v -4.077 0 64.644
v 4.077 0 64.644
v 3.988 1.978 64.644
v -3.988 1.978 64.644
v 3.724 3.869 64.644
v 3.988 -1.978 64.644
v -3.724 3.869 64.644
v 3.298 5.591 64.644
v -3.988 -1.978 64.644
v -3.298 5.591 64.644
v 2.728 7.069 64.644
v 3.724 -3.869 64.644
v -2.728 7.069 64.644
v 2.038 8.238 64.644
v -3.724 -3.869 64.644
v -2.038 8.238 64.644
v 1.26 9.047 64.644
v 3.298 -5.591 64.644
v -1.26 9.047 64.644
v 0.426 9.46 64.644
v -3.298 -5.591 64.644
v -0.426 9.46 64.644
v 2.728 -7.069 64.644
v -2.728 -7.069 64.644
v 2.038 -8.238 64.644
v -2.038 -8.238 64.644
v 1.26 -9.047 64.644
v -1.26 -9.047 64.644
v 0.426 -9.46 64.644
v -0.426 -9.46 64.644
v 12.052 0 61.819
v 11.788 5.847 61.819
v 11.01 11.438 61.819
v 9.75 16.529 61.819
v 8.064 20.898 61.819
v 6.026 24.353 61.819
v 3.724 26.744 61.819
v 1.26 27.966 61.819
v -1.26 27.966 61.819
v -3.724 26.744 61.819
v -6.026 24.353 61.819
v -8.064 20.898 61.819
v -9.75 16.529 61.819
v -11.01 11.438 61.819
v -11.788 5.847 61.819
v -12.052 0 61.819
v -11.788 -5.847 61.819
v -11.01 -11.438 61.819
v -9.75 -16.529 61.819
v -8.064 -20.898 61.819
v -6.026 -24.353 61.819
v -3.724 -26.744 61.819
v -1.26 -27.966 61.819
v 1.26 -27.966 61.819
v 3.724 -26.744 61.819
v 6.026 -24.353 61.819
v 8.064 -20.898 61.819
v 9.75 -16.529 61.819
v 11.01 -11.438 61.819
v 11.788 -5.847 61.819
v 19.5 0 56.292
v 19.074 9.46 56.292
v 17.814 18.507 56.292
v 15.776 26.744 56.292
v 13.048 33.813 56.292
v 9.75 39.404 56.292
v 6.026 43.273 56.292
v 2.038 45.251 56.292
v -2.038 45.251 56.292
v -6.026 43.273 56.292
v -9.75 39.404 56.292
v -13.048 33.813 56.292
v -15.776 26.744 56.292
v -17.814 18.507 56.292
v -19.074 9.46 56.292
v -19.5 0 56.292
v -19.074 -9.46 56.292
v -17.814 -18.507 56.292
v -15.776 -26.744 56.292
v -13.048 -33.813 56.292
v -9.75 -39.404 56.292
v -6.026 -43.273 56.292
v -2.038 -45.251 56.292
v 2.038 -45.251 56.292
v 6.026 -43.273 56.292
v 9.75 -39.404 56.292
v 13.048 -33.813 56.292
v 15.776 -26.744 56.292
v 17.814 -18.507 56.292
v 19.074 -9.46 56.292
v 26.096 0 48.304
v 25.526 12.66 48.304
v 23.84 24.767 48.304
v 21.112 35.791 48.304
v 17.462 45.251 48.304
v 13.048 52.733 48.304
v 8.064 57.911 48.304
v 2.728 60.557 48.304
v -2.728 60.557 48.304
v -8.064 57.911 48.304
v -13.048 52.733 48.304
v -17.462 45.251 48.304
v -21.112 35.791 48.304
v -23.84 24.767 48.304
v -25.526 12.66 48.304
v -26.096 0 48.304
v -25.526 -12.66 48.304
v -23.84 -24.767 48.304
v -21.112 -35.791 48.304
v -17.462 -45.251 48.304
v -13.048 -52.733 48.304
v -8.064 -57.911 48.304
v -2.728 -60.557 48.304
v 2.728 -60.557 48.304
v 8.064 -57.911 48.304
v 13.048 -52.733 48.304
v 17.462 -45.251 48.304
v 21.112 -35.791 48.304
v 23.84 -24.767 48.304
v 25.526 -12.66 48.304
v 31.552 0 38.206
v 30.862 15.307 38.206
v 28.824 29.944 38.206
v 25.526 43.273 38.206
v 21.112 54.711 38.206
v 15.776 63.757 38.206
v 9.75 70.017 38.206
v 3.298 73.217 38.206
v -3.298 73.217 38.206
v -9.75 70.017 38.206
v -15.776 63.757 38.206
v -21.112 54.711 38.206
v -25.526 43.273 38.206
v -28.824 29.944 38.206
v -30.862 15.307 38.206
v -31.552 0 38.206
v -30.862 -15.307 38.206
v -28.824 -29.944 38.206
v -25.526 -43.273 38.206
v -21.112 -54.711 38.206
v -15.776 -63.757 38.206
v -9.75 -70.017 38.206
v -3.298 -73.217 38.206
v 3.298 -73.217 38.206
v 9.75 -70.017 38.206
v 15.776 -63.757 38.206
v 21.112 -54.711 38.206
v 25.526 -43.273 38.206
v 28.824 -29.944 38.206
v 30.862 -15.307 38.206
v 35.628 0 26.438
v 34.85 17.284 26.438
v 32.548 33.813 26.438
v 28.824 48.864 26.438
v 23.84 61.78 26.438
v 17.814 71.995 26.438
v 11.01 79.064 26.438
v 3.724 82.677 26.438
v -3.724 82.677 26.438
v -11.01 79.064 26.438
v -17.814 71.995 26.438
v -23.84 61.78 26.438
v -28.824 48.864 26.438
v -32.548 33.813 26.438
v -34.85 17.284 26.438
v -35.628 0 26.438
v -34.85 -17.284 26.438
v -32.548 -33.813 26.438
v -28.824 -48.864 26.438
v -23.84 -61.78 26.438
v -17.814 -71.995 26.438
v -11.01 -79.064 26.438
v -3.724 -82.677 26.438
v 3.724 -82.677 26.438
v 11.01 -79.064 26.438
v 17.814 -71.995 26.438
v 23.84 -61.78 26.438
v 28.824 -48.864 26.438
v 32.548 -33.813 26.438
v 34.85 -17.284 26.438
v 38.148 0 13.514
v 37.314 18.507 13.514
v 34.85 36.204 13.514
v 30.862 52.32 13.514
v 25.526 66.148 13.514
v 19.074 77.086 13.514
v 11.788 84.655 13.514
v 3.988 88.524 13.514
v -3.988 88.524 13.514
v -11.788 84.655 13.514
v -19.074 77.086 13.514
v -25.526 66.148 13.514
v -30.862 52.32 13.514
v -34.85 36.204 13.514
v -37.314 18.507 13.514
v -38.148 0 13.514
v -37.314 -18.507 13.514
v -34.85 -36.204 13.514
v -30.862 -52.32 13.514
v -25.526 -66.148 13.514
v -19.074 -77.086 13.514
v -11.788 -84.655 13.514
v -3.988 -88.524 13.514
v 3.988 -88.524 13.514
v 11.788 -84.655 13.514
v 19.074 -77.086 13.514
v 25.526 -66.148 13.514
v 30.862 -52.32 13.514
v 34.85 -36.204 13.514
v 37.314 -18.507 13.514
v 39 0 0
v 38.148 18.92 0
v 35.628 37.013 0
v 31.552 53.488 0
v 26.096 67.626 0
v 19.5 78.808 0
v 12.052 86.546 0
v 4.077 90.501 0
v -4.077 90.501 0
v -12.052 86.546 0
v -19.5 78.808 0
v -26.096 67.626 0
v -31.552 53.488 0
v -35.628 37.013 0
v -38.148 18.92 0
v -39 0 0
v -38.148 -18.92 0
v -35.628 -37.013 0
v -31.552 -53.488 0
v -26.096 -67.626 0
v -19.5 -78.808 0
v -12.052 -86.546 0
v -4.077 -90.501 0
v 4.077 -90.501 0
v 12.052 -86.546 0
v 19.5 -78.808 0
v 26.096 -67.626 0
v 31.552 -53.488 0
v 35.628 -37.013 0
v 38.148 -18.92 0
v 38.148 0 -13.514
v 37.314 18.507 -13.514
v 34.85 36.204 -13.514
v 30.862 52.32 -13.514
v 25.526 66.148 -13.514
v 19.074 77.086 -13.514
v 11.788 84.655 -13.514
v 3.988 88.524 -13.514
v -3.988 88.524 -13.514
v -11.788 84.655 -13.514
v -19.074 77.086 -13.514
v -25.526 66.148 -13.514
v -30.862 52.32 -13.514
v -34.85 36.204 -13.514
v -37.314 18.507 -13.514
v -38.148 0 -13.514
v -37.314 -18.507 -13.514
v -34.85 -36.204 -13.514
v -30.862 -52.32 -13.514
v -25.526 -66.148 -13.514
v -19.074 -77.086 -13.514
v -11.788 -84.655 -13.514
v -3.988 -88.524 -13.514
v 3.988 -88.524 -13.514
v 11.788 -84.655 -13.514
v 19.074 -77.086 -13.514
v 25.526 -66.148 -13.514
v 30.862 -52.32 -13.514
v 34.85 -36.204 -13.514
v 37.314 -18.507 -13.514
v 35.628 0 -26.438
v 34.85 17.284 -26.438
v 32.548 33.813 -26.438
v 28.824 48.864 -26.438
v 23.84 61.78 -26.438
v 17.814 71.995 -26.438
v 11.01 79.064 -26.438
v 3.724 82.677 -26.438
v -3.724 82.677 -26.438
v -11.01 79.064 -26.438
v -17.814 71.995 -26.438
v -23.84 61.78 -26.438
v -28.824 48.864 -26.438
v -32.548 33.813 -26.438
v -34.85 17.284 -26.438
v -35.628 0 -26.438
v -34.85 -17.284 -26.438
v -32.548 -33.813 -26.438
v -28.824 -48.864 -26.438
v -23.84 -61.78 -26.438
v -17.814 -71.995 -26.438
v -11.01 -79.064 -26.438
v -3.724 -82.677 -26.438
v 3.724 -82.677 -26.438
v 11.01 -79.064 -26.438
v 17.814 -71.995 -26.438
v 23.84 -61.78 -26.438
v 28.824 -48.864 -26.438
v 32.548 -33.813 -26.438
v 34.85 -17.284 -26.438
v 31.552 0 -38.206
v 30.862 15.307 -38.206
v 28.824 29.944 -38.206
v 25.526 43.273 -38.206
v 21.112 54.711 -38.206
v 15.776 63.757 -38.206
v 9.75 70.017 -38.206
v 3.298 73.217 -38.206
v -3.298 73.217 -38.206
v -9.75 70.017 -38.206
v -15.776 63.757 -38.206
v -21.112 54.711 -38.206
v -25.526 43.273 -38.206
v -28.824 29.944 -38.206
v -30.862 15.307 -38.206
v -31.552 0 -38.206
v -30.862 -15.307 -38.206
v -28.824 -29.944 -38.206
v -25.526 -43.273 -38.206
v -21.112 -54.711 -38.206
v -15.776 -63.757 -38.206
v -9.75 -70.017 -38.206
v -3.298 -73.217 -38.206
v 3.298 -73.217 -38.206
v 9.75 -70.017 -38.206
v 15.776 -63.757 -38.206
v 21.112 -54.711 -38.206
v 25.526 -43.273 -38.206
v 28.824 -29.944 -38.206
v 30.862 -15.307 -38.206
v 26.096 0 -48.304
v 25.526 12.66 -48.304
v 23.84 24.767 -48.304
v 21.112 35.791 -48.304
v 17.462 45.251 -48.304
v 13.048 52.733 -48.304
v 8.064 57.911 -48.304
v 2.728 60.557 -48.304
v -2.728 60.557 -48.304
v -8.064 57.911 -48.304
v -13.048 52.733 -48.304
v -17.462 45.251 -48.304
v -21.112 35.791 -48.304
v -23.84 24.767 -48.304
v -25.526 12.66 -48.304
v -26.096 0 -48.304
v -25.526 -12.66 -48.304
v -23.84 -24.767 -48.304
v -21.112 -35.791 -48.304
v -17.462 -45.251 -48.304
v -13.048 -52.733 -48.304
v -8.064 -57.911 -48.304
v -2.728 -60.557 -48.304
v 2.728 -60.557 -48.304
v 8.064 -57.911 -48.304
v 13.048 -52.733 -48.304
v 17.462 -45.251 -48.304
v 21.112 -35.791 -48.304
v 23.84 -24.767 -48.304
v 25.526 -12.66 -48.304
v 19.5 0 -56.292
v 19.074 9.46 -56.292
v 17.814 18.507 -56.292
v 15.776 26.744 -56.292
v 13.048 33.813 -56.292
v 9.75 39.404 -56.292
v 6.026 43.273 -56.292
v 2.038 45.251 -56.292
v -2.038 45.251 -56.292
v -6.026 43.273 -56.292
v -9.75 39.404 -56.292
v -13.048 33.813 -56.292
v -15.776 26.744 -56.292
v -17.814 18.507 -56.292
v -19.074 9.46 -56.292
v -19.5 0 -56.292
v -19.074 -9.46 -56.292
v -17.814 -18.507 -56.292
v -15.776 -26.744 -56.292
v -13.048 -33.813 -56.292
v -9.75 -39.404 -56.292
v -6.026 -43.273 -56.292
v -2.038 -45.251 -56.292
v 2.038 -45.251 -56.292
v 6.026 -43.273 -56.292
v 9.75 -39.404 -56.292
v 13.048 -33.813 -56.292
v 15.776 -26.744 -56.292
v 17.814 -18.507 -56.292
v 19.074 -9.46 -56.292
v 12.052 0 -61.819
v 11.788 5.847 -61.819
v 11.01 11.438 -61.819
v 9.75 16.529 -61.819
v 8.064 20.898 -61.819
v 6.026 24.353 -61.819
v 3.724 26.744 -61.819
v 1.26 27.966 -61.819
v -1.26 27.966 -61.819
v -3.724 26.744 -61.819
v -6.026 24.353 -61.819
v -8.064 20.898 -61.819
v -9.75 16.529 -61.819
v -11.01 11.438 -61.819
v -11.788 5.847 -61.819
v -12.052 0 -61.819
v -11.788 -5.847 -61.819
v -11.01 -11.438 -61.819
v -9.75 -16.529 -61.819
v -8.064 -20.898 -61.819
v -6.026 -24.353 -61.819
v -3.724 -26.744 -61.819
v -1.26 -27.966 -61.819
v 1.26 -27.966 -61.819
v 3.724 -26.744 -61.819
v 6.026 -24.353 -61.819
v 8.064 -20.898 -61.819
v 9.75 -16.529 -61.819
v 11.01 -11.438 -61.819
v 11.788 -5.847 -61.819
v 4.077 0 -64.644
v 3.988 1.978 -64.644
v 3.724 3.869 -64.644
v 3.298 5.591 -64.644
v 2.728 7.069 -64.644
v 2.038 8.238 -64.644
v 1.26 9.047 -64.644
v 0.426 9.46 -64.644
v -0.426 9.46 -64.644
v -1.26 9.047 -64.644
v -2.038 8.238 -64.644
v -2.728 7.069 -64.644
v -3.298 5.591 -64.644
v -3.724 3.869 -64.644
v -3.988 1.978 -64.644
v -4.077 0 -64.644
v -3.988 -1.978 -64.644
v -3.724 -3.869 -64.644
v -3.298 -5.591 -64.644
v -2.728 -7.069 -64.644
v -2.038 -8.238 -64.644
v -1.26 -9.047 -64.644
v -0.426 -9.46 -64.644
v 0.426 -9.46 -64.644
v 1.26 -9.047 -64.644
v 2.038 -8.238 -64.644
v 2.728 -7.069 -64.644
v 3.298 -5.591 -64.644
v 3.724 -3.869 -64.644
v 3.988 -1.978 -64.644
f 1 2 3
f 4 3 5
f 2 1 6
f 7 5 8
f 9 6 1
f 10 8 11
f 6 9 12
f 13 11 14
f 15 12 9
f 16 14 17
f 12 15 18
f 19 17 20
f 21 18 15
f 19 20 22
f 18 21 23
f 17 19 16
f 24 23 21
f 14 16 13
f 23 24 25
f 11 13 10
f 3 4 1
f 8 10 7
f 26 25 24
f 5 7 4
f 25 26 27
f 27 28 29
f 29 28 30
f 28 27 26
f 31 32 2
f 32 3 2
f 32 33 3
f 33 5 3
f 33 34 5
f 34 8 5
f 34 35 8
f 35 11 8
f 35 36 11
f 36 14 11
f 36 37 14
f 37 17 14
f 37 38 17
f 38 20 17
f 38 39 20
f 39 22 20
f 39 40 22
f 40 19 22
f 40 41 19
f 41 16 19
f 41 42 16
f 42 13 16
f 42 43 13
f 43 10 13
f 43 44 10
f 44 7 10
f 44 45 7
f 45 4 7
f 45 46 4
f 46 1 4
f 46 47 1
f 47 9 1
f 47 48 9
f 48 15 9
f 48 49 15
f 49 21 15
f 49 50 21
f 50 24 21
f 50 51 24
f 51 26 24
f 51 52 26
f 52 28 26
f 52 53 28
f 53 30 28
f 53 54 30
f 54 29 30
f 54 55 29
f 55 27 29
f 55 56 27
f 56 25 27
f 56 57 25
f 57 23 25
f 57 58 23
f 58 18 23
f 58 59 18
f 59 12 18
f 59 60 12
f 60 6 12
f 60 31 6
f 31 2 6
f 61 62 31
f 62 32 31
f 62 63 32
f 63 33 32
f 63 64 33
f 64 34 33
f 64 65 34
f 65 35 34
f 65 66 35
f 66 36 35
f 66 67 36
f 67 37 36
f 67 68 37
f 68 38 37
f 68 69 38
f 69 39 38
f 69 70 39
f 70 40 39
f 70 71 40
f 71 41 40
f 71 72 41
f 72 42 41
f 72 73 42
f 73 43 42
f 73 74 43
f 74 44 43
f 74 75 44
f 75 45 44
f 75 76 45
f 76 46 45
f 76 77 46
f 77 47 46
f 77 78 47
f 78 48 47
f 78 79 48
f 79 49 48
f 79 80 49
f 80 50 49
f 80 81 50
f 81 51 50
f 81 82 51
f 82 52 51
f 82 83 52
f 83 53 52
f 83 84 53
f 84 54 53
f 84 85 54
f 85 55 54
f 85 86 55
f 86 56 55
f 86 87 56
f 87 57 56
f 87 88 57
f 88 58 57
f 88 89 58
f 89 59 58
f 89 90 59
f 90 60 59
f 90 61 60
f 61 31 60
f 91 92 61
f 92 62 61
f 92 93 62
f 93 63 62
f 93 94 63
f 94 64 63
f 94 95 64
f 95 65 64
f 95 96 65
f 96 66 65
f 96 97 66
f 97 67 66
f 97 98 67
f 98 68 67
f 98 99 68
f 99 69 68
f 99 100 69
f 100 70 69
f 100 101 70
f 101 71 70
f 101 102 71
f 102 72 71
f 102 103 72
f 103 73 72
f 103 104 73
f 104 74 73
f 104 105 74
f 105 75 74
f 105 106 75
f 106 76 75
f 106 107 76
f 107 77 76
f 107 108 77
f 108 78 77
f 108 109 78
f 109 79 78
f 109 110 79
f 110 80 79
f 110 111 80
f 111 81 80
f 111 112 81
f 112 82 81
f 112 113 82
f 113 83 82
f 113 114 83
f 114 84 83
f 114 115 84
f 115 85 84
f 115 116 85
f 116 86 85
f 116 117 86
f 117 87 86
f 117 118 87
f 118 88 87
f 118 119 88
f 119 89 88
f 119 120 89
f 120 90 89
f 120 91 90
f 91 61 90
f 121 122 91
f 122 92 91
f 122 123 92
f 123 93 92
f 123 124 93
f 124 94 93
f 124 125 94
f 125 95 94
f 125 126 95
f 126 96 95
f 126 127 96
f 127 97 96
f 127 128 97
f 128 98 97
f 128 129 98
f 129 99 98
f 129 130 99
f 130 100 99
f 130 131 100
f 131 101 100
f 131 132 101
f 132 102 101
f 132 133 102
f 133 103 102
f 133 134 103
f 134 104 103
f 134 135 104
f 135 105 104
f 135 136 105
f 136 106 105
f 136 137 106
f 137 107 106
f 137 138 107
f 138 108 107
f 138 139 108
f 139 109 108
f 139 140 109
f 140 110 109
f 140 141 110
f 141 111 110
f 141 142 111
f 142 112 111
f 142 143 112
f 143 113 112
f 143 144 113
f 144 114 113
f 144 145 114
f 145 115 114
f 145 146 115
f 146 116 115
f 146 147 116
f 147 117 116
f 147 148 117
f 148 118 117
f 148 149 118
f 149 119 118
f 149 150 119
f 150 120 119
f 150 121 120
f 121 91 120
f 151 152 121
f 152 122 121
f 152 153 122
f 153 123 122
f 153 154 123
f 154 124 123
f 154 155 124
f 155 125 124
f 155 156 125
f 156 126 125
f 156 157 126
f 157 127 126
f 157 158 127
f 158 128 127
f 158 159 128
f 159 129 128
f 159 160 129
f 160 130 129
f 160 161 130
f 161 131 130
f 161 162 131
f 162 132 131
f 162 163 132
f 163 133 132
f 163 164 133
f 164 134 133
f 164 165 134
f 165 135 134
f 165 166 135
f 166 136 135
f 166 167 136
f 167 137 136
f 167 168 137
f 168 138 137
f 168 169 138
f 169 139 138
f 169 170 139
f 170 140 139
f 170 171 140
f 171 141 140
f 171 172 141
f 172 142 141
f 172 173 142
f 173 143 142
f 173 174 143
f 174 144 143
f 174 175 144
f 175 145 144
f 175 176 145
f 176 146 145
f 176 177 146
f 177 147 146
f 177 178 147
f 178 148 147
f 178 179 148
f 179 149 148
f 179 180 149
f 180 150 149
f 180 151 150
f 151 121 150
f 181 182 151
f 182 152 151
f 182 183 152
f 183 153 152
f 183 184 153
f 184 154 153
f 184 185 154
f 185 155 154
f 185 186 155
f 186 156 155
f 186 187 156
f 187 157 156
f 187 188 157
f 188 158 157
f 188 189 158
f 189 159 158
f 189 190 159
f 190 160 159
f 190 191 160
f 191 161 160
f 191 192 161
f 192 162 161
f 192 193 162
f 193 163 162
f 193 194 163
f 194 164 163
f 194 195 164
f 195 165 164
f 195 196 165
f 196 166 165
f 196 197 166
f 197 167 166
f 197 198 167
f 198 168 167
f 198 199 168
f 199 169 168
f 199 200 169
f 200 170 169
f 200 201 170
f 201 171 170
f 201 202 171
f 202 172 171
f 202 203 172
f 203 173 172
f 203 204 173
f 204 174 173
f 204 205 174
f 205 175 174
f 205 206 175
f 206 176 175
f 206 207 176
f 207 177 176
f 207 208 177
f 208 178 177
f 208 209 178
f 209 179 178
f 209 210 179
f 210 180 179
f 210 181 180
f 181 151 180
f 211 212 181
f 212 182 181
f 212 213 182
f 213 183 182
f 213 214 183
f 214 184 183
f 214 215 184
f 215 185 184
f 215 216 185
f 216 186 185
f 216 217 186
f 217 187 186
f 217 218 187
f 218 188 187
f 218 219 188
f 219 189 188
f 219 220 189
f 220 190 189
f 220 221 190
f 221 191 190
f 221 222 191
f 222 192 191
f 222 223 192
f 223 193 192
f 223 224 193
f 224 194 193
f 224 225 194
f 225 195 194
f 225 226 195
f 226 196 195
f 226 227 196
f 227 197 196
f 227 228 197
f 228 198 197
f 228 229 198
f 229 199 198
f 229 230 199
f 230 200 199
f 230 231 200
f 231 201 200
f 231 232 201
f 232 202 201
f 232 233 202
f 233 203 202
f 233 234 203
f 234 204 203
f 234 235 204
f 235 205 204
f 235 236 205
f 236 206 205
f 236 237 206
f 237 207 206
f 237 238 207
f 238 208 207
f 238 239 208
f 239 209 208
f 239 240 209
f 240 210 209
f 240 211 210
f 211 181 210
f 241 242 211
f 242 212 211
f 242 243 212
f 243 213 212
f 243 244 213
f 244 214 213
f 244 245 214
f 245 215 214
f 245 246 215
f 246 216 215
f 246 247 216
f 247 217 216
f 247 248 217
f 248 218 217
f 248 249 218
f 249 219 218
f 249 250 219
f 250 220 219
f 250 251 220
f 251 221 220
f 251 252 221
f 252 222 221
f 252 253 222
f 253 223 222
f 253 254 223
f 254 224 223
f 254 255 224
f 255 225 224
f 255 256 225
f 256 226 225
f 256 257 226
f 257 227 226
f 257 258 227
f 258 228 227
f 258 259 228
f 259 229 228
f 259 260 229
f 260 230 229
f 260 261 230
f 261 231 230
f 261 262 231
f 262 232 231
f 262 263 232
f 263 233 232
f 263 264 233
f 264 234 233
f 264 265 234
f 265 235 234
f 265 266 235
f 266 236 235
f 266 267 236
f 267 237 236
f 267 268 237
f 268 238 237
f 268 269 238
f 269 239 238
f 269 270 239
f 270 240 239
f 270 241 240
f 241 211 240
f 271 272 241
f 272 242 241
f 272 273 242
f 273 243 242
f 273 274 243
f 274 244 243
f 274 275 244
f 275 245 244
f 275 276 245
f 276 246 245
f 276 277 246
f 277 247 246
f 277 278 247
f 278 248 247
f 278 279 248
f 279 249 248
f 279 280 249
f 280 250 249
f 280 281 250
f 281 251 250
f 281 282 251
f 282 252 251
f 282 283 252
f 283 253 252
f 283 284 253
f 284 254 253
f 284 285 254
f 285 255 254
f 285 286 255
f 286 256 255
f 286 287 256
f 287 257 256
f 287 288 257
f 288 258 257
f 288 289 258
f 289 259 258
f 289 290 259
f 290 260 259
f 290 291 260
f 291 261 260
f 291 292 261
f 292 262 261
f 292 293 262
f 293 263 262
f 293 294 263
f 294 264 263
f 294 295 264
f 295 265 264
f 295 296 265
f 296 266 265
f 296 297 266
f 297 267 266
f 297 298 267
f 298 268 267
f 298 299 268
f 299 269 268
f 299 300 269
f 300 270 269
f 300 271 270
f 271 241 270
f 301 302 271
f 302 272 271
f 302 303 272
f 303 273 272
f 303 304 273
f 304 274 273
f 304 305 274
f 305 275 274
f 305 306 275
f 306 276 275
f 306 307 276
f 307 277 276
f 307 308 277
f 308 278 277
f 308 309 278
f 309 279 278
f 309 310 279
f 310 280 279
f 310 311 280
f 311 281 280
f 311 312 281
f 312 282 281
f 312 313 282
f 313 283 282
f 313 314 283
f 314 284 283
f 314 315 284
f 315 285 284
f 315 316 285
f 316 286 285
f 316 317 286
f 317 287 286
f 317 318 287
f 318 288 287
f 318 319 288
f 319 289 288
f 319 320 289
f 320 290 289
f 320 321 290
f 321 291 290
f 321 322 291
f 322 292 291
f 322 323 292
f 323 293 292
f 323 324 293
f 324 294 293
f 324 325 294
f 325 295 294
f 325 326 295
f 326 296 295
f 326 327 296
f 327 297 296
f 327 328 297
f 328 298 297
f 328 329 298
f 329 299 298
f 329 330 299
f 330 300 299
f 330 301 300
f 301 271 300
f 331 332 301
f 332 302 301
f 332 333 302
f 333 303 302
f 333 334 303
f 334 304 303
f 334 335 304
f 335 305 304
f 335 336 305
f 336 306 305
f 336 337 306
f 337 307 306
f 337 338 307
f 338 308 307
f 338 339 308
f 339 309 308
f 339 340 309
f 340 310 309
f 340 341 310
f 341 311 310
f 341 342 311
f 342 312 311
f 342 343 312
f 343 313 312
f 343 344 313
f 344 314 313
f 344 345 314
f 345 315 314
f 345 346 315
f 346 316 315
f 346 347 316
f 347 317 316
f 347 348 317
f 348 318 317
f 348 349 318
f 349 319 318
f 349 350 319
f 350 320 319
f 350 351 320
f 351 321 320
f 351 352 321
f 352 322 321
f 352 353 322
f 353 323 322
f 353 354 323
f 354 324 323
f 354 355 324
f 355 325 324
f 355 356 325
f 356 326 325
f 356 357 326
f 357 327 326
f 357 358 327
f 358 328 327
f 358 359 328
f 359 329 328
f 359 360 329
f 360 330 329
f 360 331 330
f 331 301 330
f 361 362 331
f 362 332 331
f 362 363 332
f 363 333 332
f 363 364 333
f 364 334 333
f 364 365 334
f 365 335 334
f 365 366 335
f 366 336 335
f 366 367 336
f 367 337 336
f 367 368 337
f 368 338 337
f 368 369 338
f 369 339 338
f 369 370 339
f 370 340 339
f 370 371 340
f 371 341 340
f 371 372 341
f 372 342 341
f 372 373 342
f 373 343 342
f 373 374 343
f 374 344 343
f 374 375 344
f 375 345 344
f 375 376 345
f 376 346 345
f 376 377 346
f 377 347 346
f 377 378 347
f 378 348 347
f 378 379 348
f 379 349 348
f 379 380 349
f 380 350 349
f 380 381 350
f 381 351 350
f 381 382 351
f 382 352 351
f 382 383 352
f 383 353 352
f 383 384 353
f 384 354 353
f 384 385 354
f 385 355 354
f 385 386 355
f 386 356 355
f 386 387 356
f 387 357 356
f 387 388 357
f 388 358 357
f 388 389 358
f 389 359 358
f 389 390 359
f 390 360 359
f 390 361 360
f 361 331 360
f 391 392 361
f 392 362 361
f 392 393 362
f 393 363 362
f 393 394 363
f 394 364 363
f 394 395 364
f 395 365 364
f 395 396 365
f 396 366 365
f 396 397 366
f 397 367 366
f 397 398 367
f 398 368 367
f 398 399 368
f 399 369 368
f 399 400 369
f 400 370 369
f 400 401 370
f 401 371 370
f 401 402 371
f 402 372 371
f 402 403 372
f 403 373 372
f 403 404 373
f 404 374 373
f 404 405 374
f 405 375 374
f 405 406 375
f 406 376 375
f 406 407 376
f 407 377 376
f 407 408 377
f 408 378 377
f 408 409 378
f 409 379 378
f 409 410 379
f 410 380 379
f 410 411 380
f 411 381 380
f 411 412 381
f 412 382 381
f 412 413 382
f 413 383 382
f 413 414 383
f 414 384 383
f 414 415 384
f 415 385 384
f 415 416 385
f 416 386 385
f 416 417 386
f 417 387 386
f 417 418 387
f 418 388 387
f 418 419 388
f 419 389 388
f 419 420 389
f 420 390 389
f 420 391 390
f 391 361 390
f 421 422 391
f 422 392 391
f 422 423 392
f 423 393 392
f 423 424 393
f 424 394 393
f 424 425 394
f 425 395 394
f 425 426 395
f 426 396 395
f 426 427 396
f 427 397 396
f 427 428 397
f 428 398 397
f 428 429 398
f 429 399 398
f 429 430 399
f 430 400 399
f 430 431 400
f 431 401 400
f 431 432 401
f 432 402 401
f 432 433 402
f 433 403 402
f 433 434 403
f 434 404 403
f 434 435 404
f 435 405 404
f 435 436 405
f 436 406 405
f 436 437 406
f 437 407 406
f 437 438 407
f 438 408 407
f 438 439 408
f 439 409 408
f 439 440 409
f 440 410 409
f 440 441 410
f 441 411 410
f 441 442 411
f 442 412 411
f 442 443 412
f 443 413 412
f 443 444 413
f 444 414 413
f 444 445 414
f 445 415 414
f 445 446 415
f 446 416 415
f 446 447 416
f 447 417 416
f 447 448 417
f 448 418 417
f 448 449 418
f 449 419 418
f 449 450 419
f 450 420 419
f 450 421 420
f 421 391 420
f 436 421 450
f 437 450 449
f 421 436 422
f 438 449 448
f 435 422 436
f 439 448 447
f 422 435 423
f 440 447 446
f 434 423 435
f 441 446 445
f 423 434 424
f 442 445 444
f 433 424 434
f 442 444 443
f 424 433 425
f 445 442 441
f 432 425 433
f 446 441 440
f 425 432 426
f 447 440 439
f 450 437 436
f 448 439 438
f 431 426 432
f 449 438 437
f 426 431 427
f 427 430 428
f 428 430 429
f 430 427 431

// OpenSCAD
// Generated by SolidPython 1.0.1 on 2020-07-29 00:46:45


scale(v = [3, 7, 5]) {
	sphere(r = 13);
}
/***********************************************
*********      SolidPython code:      **********
************************************************
 
# import packages: SolidPython
from solid import *
from solid.utils import *
from itertools import chain, combinations, permutations


class Resize:

    def __init__(self, scad_file):
        self.scad_file = scad_file
        #self.scad_file = import_scad(scad_file)
        # cone/cylinder param:
        self.r1 = 0
        self.r2 = 0
        self.h = 0
        # rectangular prism param:
        self.w = 0
        self.l = 0
        # ellipse param:
        self.r = 0

    # import OpenScad code (file name corresponds to shape)


    # classify shape + parameters
    def assign(self, param1, param2, param3):
        if self.scad_file == 'cone.scad':
            self.r1 = param1
            self.r2 = param2
            self.h = param3
        elif self.scad_file == 'cylinder.scad':
            self.r1 = param1
            self.r2 = param2
            self.h = param3
        elif self.scad_file == 'rectangularPrism.scad':
            self.h = param1
            self.l = param2
            self.w = param3
        else:
            self.r = param1
            self.h = param2

    # resize parameters
    def iterate(self):
        x = range(3, 20, 2)
        i = 1
        if self.scad_file == 'cone.scad':
            tempList = list(permutations(x, 2))
            for temp in tempList:
                param1 = temp[0]
                param2 = temp[1]
                filepath = 'produced_scad_files/' + 'cone' + str(param1) + '_' + str(param2) + '_' + '.scad'
                scad_render_to_file(cylinder(h=param1, r1=param2, r2=0), filepath)

        elif self.scad_file == 'cylinder.scad':
            tempList = list(permutations(x, 3))
            for temp in tempList:
                param1 = temp[0]
                param2 = temp[1]
                filepath = 'produced_scad_files/' + 'cylinder' + str(param1) + '_' + str(param2) + '_' + '.scad'
                scad_render_to_file(cylinder(h=param1, r1=param2, r2=param2), filepath)

        elif self.scad_file == 'rectangularPrism.scad':
            tempList = list(permutations(x, 3))
            for temp in tempList:
                param1 = temp[0]
                param2 = temp[1]
                param3 = temp[2]
                filepath = 'produced_scad_files/' + 'rectangularPrism' + str(param1) + '_' + str(param2) + '_' + str(
                    param3) + '.scad'
                scad_render_to_file(cube(size=(param1, param2, param3)), filepath)

        elif self.scad_file == 'ellipse.scad':
            tempList = list(permutations(x, 4))
            for temp in tempList:
                param1 = temp[0]
                param2 = temp[1]
                param3 = temp[2]
                param4 = temp[3]
                filepath = 'produced_scad_files/' + 'ellipse' + str(param1) + '_' + str(param2) + '_' + str(param3) + '_' + str(param4) + '.scad'
                scad_render_to_file(scale([param1, param2, param3])(sphere(r=param4)), filepath)

    def render_to_scadfile(self):
        scad_render_to_file(scad, 'example.scad') 
 
************************************************/
